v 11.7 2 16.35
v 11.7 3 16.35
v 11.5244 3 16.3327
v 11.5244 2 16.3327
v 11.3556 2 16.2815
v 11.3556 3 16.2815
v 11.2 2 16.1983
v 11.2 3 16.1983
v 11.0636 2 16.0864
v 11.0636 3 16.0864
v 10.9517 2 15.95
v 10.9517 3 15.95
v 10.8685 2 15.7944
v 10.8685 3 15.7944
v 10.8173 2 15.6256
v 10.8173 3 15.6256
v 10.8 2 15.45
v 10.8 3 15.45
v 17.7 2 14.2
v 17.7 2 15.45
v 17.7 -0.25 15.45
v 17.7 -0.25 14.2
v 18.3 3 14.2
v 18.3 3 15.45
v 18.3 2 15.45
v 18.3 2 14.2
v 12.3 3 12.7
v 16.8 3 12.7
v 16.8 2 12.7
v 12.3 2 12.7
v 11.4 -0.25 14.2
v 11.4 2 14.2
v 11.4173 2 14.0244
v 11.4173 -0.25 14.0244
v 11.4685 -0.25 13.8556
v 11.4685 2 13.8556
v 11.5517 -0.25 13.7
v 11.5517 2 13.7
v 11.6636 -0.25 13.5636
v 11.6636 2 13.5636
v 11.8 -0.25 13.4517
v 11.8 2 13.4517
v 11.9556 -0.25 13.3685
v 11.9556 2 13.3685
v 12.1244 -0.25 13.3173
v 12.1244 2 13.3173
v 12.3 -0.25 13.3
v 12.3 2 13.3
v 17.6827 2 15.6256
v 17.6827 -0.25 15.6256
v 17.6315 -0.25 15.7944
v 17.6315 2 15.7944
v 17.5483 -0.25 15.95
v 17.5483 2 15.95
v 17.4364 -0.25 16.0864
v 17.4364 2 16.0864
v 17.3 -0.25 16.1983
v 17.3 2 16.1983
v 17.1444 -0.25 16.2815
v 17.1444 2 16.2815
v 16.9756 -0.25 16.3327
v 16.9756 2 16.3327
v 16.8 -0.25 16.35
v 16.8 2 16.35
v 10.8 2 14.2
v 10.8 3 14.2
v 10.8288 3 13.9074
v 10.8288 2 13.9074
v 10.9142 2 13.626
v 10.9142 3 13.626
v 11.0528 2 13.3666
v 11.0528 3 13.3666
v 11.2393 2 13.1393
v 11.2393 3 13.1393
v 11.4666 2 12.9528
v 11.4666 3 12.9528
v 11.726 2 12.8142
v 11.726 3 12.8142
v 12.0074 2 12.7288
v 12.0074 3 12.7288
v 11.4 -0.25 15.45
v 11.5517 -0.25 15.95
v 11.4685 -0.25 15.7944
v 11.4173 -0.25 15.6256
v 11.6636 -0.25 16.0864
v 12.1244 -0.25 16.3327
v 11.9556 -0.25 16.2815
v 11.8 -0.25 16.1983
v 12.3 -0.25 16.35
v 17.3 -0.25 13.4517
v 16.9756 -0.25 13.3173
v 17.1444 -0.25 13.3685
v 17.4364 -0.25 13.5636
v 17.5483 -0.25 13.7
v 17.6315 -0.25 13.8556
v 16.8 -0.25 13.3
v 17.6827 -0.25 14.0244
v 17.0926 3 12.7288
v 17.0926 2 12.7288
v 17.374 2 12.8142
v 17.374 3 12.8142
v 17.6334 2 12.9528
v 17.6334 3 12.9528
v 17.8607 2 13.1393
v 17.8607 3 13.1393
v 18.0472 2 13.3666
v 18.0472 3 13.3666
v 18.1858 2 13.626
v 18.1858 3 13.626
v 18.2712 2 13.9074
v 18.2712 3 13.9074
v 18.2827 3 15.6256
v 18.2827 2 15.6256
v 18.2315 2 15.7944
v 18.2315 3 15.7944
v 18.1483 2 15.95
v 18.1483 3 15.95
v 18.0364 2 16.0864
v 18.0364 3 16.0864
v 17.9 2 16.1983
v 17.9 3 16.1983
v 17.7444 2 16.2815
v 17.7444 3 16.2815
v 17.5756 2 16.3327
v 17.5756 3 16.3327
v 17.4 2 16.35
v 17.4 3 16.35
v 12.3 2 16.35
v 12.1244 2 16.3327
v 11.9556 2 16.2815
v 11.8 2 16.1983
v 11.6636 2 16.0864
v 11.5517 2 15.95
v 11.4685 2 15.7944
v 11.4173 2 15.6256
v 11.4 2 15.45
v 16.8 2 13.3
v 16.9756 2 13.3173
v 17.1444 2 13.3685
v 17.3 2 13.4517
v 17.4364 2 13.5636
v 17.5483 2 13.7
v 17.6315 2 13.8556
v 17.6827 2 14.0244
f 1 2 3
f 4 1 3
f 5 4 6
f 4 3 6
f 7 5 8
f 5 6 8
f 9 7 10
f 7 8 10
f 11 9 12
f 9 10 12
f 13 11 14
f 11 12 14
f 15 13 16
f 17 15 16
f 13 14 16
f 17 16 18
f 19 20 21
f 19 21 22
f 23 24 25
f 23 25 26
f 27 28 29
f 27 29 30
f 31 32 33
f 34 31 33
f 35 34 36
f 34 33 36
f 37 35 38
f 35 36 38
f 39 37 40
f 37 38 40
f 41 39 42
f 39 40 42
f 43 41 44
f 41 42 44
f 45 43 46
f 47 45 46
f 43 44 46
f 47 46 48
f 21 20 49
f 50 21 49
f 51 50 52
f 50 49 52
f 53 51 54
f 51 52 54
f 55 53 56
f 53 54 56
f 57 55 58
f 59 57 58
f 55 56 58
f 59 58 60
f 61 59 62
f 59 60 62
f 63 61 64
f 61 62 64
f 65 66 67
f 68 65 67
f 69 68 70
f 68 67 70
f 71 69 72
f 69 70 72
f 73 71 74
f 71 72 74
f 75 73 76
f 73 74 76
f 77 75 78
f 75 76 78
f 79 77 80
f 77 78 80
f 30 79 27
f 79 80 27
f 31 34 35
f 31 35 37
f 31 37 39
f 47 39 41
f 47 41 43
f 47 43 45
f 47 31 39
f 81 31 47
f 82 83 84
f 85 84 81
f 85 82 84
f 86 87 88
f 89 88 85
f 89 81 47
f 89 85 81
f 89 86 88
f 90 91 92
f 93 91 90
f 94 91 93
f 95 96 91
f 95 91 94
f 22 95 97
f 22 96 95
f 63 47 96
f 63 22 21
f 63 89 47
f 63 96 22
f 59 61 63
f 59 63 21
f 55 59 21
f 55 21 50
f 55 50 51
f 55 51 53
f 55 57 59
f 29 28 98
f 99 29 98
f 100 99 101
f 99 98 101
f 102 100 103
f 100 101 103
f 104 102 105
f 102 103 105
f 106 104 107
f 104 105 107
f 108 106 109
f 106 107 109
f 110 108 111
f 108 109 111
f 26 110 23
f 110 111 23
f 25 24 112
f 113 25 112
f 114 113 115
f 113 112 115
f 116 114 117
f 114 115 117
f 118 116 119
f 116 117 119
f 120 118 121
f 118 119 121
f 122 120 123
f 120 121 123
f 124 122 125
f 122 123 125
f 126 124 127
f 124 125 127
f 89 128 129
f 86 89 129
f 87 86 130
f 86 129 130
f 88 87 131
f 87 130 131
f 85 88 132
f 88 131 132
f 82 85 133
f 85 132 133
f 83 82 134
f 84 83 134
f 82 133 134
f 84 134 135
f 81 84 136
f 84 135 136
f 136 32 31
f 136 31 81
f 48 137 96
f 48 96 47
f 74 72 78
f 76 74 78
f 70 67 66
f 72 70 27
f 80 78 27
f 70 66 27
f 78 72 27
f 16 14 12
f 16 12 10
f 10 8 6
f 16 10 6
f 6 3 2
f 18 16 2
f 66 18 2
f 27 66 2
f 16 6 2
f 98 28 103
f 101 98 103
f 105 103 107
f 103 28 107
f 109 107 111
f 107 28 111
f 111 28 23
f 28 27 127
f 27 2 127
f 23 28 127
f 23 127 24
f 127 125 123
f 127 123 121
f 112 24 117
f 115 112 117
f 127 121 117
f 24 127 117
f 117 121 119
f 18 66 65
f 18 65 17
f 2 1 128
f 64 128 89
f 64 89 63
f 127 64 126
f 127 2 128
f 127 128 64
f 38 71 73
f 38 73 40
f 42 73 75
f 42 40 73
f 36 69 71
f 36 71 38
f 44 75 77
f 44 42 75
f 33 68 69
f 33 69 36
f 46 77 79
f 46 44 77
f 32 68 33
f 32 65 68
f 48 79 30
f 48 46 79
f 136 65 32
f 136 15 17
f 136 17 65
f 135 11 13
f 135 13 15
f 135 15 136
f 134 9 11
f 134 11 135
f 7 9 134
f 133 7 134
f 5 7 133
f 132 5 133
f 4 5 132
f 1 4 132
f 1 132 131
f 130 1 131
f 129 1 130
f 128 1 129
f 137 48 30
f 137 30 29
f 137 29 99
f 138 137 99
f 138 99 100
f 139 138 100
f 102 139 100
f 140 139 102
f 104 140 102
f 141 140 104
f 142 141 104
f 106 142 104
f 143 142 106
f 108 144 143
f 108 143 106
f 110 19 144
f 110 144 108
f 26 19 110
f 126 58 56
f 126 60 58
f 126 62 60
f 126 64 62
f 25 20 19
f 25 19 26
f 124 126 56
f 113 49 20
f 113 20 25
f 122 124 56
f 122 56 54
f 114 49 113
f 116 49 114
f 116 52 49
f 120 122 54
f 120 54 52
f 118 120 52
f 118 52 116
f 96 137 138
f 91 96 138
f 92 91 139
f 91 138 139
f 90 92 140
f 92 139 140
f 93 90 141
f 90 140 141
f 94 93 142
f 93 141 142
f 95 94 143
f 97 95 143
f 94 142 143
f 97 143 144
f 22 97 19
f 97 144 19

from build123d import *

# Parameters (mm, degrees)
EXTRUDE015_DEPTH = 1
EXTRUDE014_DEPTH = 2.25


with BuildPart() as extrude015:
    # Sketch015 → Extrude015 (new body)
    with BuildSketch(Plane.XZ):
        with BuildLine():
            ThreePointArc((11.7, 16.35), (11.063604, 16.086396), (10.8, 15.45))
            Line((10.8, 14.2), (10.8, 15.45))
            ThreePointArc((10.8, 14.2), (11.23934, 13.13934), (12.3, 12.7))
            Line((16.8, 12.7), (12.3, 12.7))
            ThreePointArc((16.8, 12.7), (17.86066, 13.13934), (18.3, 14.2))
            Line((18.3, 15.45), (18.3, 14.2))
            ThreePointArc((18.3, 15.45), (18.036396, 16.086396), (17.4, 16.35))
            Line((11.7, 16.35), (17.4, 16.35))
        make_face()
    extrude(amount=EXTRUDE015_DEPTH)


with BuildPart() as extrude015_1:
    # Extrude015 placement: moved
    add(extrude015.part.moved(Location((0, 3, 0))))


with BuildPart() as button1:
    # Sketch014 → Extrude014 (new body)
    with BuildSketch(Plane.XZ):
        with BuildLine():
            ThreePointArc((12.3, 16.35), (11.663604, 16.086396), (11.4, 15.45))
            Line((11.4, 14.2), (11.4, 15.45))
            ThreePointArc((11.4, 14.2), (11.663604, 13.563604), (12.3, 13.3))
            Line((16.8, 13.3), (12.3, 13.3))
            ThreePointArc((16.8, 13.3), (17.436396, 13.563604), (17.7, 14.2))
            Line((17.7, 15.45), (17.7, 14.2))
            ThreePointArc((17.7, 15.45), (17.436396, 16.086396), (16.8, 16.35))
            Line((12.3, 16.35), (16.8, 16.35))
        make_face()
    extrude(amount=EXTRUDE014_DEPTH)


with BuildPart() as button1_1:
    # Extrude014 placement: moved
    add(button1.part.moved(Location((0, 2, 0))))

    # Fusion018: union Extrude015
    add(extrude015_1.part)


solid = button1_1.part
